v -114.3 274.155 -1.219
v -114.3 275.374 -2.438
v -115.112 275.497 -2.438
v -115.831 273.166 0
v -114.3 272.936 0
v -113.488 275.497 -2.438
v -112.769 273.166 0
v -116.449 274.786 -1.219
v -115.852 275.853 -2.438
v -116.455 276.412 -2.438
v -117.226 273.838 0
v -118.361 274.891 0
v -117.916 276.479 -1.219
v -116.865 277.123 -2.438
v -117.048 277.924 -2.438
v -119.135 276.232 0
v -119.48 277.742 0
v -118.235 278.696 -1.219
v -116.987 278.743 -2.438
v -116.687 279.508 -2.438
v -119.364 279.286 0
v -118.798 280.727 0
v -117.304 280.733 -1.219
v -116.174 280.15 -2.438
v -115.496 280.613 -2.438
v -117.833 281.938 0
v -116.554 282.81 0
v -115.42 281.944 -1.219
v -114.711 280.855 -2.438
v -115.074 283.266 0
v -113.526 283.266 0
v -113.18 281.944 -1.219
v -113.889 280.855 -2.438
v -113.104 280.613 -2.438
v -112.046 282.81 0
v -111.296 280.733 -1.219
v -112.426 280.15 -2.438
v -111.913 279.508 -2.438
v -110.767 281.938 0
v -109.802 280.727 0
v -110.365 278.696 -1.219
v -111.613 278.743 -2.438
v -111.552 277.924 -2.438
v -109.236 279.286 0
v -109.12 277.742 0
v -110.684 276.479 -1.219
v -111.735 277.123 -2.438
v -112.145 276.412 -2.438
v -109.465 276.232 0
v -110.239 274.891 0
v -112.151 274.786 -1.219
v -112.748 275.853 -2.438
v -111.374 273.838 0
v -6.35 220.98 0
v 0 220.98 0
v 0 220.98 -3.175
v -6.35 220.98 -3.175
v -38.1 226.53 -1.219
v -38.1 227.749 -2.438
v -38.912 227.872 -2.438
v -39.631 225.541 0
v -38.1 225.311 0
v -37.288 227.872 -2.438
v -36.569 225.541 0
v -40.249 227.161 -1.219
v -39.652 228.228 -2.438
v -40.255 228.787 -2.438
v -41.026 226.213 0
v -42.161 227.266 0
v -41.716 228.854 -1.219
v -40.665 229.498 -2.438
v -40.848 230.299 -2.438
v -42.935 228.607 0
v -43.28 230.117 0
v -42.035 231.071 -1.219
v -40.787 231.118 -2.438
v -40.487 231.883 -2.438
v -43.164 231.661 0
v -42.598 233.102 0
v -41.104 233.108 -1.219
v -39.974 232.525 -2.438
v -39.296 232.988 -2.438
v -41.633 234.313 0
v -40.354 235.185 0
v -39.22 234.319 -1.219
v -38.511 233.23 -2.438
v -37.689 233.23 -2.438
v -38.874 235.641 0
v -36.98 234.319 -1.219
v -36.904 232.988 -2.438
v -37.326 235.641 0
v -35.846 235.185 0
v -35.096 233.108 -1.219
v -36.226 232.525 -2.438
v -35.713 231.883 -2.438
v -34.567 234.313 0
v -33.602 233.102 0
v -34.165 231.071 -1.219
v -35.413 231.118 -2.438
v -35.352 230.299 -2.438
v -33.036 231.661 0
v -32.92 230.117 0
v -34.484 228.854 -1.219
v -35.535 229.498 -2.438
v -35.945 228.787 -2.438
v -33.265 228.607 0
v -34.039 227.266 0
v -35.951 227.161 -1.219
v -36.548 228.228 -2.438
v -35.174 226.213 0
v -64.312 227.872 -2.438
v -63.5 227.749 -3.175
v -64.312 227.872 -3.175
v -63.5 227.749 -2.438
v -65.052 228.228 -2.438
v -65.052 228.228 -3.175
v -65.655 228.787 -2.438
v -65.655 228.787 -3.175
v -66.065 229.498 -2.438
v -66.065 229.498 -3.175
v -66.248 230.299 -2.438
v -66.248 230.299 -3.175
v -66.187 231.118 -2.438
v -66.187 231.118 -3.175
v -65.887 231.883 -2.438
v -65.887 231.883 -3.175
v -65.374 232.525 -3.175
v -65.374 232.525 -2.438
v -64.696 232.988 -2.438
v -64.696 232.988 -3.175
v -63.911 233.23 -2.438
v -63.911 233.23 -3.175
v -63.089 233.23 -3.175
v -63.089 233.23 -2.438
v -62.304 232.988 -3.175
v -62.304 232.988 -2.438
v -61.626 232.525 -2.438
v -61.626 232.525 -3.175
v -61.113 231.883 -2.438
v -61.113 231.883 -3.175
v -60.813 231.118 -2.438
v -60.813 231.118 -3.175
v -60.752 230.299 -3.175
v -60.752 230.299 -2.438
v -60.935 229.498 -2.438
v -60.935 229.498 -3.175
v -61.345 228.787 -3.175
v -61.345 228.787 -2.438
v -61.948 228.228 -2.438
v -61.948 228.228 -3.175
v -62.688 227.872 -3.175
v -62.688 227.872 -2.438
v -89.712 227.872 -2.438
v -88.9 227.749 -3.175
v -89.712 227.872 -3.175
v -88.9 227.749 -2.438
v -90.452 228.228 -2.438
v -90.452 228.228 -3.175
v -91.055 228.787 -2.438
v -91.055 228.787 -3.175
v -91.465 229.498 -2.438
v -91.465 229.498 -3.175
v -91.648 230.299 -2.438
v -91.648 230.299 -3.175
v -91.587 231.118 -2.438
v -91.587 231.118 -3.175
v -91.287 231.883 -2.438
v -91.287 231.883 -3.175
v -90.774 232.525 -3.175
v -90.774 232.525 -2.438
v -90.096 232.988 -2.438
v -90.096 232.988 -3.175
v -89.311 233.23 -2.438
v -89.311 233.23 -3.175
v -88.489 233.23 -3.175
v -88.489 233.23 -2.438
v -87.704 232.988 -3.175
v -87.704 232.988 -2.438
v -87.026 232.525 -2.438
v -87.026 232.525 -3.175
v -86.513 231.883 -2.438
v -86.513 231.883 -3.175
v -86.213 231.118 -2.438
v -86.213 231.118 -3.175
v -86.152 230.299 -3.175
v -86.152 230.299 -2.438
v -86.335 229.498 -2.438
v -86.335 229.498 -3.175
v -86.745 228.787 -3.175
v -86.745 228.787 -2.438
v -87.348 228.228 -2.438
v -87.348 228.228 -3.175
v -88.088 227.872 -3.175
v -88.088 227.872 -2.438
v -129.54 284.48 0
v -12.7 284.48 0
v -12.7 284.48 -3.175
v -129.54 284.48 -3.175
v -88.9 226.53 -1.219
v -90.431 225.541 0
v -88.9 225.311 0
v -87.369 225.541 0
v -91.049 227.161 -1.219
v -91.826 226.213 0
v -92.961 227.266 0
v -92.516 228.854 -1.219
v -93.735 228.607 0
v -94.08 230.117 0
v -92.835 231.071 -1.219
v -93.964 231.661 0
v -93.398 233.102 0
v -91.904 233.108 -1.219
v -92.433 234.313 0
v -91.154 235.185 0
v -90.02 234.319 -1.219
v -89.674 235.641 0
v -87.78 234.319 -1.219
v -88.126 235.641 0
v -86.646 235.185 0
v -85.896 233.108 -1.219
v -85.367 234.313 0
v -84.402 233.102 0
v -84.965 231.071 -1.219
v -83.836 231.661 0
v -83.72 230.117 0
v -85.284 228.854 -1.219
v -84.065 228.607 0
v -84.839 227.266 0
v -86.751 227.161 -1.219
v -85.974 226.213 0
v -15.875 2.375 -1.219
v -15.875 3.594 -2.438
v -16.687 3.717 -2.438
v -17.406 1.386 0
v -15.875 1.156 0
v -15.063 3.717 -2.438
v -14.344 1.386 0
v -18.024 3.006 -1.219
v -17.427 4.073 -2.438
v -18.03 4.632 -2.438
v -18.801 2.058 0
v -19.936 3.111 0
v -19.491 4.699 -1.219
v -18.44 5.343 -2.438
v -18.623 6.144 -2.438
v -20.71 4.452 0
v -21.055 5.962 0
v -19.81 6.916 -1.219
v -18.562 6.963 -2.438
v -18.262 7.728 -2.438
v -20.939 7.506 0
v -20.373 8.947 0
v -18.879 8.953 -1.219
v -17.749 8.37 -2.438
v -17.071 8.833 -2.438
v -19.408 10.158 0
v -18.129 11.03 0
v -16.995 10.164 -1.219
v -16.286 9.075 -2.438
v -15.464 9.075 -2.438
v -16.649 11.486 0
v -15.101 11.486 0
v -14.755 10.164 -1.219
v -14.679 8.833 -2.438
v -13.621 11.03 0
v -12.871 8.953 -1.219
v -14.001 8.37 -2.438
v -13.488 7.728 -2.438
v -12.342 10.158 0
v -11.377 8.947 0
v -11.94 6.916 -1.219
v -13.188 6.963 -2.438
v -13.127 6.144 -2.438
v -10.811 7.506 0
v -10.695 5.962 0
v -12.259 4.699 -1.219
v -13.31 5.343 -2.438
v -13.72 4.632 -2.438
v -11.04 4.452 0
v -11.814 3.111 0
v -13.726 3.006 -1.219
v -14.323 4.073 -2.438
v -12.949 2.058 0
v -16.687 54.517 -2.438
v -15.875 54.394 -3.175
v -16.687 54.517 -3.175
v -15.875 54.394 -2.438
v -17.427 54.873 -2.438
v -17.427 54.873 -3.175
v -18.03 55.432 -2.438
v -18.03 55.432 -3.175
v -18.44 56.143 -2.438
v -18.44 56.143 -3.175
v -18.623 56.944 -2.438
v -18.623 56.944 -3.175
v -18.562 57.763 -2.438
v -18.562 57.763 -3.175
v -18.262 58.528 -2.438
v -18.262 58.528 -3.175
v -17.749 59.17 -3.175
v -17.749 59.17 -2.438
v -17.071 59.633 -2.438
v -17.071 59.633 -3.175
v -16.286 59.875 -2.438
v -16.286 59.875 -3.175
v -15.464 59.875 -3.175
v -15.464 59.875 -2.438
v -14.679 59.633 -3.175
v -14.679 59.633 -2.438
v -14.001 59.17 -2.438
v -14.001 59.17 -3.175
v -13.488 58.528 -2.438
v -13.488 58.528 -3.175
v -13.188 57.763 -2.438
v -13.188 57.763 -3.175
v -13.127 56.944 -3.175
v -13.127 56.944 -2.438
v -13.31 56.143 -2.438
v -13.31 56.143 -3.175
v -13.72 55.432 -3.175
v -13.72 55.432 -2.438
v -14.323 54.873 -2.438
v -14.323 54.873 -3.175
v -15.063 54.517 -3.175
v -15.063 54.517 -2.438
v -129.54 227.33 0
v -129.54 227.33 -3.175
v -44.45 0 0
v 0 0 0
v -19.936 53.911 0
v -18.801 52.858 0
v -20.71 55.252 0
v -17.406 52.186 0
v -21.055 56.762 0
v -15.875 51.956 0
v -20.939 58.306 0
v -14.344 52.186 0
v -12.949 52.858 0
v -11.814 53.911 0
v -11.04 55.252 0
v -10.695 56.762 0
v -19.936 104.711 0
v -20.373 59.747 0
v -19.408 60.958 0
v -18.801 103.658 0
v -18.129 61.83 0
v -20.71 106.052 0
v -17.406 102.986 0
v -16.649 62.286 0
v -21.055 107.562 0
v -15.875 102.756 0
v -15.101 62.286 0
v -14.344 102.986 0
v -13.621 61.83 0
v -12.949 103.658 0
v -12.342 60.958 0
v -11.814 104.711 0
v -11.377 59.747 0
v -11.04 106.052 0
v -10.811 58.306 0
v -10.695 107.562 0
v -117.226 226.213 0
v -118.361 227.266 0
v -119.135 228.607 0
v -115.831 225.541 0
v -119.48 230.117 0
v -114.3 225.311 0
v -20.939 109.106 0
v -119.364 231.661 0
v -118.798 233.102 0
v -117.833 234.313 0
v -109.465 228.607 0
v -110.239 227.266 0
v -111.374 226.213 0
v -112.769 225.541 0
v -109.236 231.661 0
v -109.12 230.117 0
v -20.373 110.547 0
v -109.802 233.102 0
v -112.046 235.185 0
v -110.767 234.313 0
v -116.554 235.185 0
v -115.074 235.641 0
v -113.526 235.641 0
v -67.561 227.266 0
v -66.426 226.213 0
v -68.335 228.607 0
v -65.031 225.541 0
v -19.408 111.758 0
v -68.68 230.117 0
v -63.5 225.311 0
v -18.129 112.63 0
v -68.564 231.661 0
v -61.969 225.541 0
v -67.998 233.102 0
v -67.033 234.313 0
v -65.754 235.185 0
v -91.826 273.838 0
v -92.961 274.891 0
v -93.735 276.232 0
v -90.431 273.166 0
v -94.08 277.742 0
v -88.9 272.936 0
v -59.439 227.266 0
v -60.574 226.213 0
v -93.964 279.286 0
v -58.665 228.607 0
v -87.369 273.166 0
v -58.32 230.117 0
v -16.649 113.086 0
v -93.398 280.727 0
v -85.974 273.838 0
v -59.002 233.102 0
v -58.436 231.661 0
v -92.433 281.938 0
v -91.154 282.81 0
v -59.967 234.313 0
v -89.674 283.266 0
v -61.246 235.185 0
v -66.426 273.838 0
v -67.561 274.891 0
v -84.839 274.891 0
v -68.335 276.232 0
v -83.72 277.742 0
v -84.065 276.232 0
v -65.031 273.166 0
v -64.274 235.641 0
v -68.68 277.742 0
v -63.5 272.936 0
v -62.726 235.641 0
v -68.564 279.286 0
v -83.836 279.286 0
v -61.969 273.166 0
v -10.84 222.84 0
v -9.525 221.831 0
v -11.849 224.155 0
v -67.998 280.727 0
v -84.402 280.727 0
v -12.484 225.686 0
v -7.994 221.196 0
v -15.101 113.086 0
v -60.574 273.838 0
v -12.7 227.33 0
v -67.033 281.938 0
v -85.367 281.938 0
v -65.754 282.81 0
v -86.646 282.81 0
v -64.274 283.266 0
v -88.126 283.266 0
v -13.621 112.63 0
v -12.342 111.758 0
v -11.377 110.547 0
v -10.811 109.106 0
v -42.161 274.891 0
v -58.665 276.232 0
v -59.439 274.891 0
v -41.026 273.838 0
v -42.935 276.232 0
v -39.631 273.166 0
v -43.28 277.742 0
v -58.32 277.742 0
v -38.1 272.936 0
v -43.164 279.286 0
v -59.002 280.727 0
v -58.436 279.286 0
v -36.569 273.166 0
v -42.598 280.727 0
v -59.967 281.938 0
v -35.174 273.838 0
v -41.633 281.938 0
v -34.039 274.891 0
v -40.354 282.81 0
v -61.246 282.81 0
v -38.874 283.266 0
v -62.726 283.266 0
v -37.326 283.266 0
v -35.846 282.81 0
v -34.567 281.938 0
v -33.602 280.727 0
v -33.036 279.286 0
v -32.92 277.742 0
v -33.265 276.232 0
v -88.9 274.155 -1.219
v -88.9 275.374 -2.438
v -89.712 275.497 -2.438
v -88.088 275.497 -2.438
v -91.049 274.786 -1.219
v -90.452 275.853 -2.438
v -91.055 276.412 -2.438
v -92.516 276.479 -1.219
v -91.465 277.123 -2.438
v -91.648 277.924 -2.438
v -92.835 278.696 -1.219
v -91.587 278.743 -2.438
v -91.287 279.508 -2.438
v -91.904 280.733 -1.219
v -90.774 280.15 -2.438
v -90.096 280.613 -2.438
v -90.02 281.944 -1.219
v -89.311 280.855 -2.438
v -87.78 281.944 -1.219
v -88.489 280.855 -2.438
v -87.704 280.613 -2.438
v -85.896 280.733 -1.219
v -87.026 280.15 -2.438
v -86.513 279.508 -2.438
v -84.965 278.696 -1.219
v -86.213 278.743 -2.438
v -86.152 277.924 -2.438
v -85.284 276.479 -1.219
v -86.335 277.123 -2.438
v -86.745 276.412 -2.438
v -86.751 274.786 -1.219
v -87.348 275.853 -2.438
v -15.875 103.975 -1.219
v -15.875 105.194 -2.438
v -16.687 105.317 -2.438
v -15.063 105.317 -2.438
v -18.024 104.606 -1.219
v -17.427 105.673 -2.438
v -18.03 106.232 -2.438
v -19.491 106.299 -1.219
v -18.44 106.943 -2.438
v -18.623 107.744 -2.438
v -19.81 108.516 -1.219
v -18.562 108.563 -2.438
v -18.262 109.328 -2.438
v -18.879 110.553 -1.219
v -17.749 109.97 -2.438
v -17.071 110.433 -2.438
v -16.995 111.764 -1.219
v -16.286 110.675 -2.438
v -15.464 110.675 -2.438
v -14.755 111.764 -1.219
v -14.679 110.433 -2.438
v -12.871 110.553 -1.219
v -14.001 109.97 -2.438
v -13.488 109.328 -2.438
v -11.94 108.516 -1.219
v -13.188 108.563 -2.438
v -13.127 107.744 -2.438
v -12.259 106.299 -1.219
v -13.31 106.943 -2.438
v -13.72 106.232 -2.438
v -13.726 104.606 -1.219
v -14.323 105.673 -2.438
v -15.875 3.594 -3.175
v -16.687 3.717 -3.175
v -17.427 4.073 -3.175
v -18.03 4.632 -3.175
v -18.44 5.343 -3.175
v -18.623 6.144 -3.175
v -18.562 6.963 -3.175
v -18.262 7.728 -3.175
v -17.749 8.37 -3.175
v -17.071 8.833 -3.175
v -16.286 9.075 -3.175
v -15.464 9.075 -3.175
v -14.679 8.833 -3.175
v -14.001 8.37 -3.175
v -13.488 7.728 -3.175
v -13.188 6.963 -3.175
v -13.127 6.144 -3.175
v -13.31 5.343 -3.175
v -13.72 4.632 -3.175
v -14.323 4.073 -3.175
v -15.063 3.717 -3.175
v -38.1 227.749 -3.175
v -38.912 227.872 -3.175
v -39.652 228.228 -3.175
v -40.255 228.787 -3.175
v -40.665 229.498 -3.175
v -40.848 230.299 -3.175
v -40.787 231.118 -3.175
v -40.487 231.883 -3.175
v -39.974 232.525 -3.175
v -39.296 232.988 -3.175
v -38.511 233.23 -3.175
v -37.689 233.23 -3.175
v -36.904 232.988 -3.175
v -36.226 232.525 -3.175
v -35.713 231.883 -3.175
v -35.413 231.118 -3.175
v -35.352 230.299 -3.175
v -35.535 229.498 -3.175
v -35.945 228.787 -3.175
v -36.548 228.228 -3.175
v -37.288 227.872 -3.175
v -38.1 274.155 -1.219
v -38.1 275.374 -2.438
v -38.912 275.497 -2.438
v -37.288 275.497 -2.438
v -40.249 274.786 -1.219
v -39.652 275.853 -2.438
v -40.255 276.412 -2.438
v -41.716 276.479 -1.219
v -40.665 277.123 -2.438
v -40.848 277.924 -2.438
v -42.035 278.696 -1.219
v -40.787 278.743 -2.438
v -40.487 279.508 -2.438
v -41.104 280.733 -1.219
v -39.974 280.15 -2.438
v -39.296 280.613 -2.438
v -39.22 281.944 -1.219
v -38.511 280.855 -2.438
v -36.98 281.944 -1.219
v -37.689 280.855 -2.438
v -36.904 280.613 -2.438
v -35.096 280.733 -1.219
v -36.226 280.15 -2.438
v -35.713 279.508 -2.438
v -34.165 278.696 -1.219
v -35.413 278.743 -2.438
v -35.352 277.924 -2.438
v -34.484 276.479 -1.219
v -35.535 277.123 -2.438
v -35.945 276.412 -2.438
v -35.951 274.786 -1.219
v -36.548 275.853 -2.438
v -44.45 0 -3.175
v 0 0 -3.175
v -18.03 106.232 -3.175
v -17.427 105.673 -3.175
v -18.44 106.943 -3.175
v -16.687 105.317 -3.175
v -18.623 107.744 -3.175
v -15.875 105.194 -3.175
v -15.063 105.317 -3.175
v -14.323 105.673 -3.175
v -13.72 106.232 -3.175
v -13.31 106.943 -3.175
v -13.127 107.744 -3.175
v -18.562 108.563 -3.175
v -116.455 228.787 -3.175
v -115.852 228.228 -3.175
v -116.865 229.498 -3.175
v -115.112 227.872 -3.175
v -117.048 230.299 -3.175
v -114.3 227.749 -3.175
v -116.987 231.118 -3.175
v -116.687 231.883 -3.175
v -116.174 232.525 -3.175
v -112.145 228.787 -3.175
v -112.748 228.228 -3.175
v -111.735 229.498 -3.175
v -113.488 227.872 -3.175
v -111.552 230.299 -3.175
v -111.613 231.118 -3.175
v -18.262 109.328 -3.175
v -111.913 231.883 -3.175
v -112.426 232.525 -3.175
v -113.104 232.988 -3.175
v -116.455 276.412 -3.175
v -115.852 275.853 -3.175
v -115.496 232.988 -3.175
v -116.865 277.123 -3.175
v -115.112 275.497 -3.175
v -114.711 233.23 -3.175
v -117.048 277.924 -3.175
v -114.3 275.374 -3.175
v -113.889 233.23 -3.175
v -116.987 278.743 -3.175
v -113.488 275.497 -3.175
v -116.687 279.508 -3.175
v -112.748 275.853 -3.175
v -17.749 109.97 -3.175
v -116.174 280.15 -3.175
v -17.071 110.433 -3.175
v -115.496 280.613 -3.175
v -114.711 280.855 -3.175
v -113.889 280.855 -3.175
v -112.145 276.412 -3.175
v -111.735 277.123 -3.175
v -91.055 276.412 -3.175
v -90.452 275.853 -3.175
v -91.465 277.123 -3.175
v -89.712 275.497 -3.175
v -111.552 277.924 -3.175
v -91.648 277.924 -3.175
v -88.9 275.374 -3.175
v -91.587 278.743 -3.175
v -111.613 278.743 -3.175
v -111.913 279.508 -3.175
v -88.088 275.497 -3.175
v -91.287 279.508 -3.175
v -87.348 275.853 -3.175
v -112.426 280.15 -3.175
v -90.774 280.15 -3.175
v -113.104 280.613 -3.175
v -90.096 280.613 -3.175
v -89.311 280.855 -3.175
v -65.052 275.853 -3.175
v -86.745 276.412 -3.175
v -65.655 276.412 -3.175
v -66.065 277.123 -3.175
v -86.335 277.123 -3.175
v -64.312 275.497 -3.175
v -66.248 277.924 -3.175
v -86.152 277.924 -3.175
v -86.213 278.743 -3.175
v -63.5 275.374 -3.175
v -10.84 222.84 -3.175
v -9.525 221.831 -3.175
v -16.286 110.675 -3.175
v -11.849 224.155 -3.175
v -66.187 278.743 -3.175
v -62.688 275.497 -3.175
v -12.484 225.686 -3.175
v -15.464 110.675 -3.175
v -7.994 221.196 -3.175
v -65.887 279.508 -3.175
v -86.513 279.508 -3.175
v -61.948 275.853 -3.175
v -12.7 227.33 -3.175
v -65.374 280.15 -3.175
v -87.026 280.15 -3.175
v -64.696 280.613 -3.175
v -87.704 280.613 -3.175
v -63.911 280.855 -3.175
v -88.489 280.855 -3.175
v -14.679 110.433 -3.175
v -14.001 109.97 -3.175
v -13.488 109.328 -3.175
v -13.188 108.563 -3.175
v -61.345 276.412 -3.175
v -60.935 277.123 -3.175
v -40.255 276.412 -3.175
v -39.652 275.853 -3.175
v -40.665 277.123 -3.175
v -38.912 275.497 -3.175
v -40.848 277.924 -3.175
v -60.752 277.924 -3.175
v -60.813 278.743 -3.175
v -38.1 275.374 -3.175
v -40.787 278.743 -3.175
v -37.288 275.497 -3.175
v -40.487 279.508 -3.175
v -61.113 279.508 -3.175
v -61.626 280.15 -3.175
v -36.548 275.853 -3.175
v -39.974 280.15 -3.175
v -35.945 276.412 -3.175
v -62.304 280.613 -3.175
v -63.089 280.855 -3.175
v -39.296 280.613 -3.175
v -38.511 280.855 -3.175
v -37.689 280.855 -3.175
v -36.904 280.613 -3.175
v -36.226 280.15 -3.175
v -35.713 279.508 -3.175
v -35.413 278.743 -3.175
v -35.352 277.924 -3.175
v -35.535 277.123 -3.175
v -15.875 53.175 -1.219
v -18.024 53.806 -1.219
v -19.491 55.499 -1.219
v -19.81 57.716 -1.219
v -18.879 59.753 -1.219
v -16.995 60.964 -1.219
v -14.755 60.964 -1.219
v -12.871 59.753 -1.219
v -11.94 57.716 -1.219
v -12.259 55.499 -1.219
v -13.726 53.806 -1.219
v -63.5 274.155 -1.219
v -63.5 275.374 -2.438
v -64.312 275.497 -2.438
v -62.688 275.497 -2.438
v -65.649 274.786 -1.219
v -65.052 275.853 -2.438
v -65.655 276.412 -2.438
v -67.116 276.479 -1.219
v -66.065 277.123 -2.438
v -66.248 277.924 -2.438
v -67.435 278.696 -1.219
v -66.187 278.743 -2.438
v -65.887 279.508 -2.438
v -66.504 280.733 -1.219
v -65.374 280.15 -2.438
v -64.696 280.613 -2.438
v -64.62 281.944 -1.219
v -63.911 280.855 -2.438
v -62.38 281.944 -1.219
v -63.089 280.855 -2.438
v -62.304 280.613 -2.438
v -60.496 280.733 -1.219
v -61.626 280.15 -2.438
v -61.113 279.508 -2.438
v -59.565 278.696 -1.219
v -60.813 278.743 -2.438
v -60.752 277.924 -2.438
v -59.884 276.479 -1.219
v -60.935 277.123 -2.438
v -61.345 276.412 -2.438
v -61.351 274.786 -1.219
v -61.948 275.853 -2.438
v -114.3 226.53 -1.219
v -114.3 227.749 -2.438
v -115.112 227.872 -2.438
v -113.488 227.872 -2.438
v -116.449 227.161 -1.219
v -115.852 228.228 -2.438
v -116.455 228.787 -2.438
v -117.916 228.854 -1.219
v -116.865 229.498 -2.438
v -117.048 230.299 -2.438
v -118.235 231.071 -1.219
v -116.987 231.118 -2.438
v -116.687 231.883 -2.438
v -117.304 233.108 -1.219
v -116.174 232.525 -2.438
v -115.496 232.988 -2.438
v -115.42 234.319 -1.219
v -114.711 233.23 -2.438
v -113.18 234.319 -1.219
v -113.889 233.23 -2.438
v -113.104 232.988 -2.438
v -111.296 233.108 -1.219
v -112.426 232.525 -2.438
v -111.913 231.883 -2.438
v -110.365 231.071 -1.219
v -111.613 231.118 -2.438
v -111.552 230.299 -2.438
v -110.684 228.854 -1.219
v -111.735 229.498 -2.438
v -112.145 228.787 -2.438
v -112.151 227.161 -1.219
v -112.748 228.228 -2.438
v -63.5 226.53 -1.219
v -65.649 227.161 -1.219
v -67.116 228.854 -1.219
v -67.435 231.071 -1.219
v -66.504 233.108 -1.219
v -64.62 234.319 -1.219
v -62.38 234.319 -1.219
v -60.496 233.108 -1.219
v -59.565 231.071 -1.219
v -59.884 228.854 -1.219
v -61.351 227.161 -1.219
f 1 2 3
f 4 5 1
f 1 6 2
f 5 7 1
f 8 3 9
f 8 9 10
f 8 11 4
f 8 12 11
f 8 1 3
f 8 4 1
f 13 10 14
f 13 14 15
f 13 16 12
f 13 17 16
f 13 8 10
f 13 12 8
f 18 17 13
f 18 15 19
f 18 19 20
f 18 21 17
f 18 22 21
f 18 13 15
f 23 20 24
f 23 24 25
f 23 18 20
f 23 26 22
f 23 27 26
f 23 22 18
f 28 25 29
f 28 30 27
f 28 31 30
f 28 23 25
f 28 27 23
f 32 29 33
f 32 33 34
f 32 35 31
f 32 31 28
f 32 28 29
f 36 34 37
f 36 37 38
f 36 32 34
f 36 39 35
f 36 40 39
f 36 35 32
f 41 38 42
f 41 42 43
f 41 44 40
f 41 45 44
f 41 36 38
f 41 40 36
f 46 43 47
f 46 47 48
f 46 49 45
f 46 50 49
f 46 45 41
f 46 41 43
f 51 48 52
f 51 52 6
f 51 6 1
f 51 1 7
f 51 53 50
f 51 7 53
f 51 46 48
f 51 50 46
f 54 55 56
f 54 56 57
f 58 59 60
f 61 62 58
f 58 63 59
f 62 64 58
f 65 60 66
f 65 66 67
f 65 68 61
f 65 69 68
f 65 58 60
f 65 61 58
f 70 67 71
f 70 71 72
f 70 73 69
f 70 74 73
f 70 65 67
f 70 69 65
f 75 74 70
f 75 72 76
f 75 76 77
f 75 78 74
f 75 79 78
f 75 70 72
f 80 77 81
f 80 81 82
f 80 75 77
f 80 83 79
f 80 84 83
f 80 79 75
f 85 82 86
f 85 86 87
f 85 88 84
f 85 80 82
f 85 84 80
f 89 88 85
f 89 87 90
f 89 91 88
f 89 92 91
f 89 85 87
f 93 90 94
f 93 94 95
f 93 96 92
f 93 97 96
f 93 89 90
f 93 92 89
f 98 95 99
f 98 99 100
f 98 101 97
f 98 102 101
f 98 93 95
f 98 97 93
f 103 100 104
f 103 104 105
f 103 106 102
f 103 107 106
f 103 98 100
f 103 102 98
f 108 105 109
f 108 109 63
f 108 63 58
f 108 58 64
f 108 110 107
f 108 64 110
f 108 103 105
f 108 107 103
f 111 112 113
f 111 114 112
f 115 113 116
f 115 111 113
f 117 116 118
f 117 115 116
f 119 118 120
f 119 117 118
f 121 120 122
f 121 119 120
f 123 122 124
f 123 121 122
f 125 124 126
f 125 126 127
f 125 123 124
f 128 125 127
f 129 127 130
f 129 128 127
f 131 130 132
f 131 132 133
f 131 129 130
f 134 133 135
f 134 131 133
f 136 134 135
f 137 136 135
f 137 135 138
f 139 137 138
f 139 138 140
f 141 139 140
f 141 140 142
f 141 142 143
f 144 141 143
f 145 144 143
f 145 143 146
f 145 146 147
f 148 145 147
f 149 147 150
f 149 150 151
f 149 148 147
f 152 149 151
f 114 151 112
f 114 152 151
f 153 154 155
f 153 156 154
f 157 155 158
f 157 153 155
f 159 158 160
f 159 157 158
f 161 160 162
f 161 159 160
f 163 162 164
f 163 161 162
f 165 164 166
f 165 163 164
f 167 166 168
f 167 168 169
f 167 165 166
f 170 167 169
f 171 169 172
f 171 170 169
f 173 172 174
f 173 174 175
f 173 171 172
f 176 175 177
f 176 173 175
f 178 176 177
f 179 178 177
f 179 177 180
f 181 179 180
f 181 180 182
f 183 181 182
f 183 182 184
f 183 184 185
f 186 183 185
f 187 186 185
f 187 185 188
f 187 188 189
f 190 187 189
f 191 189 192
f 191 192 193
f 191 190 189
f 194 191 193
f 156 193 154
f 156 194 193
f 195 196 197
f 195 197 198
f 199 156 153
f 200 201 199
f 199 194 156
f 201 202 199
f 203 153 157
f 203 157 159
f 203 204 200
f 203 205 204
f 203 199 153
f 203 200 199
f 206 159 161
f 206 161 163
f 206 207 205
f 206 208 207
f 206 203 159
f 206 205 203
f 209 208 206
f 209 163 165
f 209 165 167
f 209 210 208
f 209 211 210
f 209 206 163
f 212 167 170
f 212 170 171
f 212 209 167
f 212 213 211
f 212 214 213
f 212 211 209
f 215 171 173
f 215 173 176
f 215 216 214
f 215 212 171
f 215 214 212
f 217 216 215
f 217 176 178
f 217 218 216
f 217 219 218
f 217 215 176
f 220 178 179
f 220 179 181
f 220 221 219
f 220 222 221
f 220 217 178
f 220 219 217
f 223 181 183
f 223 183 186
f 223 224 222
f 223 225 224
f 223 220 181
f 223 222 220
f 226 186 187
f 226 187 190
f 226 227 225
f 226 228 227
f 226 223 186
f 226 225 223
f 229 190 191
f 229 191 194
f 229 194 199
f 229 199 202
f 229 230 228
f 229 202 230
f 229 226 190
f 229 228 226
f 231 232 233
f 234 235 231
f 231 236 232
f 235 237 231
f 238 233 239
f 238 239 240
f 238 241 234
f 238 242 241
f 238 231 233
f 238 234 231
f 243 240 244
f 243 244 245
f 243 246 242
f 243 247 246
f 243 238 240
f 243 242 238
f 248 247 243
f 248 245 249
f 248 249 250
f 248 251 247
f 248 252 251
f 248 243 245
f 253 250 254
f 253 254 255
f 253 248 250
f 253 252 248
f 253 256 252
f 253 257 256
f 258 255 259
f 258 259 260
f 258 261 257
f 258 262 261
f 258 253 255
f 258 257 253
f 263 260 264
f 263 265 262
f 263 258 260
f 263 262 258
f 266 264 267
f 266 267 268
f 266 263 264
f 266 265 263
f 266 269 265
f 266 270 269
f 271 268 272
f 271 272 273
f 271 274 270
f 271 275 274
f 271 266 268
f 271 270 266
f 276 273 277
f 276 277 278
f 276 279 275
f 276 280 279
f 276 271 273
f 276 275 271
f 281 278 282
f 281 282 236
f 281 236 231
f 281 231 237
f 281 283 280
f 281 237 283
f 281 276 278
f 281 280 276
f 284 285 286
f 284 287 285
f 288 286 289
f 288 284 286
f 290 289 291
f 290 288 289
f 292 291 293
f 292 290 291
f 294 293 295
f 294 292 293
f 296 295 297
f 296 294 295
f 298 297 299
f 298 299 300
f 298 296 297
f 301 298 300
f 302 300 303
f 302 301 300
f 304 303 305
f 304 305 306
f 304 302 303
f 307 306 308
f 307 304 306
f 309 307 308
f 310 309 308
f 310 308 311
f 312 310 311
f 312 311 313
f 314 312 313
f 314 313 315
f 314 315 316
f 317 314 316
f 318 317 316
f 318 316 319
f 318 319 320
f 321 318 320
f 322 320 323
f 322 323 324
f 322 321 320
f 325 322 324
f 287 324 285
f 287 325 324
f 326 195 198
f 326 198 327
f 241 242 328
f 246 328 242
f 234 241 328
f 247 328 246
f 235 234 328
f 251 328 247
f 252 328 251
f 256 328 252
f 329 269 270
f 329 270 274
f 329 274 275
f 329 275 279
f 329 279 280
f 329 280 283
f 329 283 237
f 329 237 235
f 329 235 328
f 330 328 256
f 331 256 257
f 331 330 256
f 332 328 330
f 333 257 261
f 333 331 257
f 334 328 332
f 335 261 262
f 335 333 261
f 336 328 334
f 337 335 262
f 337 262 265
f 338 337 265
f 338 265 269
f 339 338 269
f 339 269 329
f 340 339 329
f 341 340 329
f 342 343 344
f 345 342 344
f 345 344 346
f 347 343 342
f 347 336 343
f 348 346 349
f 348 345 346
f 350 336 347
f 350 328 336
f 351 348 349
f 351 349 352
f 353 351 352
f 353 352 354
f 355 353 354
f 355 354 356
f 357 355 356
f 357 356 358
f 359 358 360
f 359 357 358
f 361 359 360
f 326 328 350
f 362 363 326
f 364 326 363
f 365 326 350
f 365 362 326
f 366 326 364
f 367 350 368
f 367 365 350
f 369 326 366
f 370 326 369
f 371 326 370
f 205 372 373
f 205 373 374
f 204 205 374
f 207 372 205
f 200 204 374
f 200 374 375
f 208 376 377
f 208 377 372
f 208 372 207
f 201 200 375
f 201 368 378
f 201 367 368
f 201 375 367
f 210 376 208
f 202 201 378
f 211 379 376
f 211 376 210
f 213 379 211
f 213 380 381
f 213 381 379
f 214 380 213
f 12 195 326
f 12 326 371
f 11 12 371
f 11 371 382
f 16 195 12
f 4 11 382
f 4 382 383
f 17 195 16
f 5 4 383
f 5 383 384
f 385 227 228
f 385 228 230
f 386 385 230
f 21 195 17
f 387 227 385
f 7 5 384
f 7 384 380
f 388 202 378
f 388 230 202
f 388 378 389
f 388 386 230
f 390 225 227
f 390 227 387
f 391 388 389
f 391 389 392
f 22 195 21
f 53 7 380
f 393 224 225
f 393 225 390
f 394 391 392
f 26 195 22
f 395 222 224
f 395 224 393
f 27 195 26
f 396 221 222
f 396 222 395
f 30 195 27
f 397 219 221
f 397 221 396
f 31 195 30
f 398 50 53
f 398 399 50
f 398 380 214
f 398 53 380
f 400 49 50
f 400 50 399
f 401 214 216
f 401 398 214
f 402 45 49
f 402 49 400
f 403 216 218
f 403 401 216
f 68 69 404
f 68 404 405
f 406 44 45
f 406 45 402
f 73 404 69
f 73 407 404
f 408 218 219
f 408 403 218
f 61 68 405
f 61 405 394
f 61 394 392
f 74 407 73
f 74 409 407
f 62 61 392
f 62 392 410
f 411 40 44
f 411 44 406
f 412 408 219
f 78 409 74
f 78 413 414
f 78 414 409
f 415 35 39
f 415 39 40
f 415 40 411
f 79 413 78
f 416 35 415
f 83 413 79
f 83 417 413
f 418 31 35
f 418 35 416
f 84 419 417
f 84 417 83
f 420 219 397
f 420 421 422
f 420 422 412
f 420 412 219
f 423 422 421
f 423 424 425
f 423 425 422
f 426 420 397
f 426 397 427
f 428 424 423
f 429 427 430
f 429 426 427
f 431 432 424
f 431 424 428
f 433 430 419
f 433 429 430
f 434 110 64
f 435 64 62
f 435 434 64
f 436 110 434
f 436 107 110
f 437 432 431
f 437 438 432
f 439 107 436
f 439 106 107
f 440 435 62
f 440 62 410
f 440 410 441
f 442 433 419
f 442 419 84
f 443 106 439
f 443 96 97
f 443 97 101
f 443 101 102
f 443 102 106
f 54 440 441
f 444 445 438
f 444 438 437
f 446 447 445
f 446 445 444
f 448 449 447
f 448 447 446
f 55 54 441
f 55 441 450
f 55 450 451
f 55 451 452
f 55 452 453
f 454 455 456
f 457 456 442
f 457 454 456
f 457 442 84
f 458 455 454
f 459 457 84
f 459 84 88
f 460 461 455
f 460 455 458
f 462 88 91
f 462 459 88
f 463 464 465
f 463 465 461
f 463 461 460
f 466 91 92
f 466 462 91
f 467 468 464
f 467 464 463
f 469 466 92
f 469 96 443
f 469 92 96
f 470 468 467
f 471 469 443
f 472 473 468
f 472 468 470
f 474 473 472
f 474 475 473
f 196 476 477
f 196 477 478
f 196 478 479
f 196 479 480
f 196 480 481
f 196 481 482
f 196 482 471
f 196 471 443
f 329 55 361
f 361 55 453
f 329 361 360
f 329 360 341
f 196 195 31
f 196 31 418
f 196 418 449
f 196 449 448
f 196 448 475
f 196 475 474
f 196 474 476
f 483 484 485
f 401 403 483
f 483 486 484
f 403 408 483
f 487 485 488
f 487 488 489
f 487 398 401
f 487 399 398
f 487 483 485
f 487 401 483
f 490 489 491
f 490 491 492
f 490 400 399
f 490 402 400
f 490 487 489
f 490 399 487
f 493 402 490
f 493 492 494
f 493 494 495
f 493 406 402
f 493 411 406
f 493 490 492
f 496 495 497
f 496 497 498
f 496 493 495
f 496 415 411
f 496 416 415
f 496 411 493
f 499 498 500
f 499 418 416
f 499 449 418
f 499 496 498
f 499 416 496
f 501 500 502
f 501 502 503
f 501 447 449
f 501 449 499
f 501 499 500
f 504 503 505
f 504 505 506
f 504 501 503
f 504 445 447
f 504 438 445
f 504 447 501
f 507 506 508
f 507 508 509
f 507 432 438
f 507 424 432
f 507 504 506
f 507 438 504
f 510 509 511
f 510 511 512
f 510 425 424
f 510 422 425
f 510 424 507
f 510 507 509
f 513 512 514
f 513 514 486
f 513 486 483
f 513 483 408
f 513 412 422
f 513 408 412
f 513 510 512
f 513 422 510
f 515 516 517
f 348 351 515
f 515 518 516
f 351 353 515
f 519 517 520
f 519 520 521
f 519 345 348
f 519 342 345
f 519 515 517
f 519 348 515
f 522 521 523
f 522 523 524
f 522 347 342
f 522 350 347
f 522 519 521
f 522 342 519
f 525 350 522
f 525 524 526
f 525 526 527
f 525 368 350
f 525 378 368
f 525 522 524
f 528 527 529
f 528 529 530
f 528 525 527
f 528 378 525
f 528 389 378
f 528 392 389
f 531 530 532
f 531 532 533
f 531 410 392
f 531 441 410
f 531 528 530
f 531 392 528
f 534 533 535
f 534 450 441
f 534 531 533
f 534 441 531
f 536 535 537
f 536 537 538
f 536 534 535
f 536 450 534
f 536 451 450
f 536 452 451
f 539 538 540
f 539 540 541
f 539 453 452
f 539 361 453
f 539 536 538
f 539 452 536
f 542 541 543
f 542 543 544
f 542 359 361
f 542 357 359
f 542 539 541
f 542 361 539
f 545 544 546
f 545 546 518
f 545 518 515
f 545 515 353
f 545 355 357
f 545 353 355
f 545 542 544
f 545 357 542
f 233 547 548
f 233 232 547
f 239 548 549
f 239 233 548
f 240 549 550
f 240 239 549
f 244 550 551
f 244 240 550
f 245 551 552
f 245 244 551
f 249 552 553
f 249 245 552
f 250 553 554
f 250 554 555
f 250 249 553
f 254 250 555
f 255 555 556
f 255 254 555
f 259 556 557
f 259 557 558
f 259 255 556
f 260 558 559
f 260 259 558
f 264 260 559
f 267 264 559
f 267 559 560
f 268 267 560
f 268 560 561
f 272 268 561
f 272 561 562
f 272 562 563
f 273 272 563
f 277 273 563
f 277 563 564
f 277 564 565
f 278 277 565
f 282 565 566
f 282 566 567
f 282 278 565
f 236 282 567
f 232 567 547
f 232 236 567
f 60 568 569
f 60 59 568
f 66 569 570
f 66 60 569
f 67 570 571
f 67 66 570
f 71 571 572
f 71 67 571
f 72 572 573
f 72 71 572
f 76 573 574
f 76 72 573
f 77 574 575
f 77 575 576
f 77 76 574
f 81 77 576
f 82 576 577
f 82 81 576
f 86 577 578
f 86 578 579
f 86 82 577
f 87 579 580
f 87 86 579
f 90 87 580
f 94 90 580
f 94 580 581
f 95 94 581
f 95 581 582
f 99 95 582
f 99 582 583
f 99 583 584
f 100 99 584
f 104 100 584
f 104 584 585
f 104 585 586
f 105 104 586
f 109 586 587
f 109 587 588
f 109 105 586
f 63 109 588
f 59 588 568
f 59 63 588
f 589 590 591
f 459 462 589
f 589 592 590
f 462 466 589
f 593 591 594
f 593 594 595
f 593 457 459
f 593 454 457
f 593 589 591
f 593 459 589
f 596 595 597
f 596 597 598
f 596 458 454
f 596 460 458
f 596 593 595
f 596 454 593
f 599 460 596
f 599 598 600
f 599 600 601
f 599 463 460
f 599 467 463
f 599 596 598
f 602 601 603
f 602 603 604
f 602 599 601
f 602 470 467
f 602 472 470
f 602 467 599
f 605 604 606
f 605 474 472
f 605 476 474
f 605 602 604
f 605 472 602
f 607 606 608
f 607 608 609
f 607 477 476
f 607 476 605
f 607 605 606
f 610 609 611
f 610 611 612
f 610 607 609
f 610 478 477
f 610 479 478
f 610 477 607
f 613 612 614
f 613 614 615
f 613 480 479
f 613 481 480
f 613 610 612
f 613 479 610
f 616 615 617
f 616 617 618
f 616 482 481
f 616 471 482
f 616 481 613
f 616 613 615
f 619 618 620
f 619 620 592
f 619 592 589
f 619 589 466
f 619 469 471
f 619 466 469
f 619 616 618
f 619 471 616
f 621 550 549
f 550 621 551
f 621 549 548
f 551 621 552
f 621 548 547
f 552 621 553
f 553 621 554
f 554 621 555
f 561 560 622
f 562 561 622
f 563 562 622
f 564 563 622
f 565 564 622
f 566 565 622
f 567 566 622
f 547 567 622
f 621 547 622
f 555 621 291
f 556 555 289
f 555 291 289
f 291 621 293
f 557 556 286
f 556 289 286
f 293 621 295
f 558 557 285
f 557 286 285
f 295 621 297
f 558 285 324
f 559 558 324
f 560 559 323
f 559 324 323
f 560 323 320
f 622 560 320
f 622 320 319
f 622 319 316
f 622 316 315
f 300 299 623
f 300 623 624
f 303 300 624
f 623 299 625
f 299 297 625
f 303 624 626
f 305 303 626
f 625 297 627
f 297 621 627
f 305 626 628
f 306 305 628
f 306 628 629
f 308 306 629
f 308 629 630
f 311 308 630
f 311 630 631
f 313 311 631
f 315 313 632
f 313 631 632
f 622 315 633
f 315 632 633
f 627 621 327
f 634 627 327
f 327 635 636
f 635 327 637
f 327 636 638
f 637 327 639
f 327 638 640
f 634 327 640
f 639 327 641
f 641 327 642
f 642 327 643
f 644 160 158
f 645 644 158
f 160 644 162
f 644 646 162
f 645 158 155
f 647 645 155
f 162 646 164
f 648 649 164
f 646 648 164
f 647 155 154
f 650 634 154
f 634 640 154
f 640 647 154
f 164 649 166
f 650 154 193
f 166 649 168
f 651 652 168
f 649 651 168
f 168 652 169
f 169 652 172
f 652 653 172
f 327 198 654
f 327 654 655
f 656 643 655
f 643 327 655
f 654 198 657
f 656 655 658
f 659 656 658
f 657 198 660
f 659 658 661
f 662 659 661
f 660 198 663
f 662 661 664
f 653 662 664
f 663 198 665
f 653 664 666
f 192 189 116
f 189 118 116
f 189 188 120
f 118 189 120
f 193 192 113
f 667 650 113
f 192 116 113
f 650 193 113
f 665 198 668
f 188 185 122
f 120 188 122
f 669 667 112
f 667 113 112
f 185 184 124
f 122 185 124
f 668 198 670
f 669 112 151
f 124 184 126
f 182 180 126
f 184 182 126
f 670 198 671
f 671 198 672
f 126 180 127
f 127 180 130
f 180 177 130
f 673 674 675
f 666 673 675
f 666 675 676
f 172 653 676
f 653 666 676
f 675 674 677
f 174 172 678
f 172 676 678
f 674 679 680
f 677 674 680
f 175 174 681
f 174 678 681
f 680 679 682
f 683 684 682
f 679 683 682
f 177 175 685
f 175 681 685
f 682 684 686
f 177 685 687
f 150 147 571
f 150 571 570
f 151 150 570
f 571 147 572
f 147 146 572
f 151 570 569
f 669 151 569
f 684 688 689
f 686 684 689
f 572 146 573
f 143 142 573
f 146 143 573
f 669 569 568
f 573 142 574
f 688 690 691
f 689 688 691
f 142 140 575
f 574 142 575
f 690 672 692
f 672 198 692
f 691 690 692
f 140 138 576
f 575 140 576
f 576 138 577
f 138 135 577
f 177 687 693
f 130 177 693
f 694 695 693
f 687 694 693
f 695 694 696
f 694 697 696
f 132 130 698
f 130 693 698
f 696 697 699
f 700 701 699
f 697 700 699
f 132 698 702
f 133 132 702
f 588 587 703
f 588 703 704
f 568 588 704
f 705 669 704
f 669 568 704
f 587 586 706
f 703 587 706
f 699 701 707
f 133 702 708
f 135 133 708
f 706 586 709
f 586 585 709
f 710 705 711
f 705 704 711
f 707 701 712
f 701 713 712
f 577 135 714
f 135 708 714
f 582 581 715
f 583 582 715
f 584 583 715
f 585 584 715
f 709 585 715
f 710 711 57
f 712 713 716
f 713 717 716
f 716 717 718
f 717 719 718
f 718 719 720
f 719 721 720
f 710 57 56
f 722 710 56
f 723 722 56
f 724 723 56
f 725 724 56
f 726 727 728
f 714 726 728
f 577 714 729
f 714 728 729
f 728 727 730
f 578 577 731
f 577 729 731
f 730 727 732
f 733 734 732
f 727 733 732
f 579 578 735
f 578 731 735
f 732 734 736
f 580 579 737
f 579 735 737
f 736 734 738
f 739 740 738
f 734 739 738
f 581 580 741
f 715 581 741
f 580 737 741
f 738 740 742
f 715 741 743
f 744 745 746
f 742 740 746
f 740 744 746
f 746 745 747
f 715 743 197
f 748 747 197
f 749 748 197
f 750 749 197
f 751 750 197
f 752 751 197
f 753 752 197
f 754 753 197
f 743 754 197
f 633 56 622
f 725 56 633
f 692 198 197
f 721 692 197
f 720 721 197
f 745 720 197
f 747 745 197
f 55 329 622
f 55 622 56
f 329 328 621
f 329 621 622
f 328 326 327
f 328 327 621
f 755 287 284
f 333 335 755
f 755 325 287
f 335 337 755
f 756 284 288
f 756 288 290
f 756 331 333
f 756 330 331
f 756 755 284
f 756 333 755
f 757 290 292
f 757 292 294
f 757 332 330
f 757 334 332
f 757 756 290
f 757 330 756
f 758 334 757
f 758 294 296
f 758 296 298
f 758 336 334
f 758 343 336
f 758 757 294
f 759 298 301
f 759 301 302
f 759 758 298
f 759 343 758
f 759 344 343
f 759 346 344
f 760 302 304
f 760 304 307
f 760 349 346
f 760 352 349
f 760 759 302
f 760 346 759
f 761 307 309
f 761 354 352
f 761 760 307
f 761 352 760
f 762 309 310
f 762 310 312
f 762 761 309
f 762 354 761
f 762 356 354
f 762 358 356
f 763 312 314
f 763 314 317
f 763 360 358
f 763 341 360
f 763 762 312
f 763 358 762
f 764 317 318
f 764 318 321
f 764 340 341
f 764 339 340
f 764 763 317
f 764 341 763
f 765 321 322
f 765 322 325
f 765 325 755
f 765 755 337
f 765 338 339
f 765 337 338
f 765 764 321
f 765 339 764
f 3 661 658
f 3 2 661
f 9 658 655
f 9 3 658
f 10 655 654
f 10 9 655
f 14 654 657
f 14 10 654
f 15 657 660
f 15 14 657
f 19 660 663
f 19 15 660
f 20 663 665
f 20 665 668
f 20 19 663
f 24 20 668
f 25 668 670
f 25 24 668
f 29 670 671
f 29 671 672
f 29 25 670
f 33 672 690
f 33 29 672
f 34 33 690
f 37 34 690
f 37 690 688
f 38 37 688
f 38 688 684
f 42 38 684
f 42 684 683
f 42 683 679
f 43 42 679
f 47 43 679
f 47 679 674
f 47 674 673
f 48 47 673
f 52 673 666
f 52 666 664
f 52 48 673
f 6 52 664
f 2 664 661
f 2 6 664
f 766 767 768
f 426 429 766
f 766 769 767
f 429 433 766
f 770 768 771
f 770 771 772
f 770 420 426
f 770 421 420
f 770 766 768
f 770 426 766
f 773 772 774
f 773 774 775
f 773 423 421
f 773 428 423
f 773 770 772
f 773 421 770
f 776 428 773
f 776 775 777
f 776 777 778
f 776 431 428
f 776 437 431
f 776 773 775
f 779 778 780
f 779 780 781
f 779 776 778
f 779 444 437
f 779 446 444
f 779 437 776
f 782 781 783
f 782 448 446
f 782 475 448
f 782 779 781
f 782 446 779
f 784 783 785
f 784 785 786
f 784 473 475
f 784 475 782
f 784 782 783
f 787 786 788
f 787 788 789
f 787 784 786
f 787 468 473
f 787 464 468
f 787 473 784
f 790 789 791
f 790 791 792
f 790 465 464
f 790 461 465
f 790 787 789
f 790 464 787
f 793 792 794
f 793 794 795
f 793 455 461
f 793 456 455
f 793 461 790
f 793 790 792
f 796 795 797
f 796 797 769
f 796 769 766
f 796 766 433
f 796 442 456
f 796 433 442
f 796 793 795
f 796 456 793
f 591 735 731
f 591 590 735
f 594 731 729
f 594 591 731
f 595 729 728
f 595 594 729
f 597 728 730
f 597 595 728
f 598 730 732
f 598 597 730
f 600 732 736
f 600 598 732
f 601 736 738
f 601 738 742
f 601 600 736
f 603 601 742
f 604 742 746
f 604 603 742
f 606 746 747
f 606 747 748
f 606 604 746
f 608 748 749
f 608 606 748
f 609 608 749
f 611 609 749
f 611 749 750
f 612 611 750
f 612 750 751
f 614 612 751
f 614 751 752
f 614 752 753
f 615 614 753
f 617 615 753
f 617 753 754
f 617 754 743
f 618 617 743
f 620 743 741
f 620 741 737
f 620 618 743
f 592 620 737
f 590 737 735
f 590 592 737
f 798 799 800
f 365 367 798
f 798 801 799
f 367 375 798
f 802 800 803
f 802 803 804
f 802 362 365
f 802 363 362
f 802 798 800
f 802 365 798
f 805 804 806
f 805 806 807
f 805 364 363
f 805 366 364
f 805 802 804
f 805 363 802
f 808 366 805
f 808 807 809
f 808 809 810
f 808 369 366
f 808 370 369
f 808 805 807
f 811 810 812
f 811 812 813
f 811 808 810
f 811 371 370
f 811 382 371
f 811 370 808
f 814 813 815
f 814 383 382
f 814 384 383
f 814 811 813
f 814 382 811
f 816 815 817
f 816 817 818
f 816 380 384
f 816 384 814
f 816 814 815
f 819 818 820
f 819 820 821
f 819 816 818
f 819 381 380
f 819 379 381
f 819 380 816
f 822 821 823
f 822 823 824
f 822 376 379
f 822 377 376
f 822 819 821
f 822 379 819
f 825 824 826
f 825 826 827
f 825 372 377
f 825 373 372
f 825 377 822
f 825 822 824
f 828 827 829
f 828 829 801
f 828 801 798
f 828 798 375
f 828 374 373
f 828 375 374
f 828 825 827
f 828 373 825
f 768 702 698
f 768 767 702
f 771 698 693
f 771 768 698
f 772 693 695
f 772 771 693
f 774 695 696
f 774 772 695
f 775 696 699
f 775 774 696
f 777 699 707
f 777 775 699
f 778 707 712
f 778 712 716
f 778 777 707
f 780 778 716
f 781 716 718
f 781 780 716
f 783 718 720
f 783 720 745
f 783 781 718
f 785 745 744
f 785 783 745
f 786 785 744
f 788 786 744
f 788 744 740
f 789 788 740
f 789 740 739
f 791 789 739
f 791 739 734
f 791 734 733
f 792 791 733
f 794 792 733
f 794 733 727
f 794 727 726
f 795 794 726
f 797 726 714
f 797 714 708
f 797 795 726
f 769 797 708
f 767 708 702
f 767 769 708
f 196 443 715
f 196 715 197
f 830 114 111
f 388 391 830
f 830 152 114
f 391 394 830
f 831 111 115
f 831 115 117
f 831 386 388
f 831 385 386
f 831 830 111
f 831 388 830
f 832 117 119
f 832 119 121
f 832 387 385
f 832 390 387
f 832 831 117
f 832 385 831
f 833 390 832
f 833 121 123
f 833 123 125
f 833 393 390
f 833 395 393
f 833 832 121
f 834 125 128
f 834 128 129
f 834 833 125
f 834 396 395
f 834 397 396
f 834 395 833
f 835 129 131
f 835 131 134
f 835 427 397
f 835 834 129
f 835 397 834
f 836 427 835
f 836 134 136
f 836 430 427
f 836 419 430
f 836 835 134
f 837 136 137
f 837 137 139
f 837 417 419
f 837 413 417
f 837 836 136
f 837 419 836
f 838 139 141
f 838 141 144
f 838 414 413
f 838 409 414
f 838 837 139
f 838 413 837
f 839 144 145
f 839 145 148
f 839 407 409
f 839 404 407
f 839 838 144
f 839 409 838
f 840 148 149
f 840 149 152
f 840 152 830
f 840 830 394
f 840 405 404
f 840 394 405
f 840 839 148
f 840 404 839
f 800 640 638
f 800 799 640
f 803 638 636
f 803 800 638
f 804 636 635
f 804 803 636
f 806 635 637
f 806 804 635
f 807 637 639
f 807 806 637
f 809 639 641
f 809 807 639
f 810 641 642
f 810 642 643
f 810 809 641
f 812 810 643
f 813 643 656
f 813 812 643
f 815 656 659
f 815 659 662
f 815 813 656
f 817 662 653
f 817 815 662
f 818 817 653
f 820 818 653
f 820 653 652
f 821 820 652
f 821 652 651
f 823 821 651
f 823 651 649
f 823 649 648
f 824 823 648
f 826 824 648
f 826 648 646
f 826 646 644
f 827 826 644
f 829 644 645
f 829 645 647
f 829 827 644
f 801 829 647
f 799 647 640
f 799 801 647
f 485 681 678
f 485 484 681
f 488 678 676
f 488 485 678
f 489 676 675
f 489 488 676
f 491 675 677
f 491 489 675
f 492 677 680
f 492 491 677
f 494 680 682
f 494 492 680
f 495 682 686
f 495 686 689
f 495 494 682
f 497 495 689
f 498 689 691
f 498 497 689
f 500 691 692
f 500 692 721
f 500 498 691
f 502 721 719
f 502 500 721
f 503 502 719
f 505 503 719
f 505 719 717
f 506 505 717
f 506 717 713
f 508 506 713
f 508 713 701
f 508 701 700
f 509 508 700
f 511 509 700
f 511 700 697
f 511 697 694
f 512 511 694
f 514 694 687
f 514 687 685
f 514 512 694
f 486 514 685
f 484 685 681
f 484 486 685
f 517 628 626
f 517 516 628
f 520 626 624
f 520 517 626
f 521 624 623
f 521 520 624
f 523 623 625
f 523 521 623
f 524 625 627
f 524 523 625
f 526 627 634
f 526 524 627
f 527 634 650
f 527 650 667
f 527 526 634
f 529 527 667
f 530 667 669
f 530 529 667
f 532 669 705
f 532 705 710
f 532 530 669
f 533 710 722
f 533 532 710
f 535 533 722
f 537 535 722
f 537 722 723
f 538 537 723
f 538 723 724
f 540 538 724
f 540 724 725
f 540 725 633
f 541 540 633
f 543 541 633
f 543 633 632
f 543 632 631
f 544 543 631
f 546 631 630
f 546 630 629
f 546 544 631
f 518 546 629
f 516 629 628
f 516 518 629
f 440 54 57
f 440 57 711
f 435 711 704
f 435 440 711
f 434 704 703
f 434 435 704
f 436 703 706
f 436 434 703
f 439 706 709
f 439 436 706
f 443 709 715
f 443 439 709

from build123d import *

# Parameters (mm, degrees)
BOSS_EXTRUDE1_DEPTH                       = 3.175
CSK_FOR_0_FLAT_HEAD_MACHINE_SCREW_2_COUNT = 2
CSK_FOR_0_FLAT_HEAD_MACHINE_SCREW_2_PITCH = 47.625
LPATTERN1_COUNT                           = 4
LPATTERN1_PITCH                           = 25.4
LPATTERN2_COUNT                           = 3
LPATTERN2_PITCH                           = 50.8


with BuildPart() as part:
    # Sketch1 → Boss-Extrude1 (new body)
    with BuildSketch(Plane.XY):
        with BuildLine():
            Line((0, 0), (0, 220.98))
            Line((0, 220.98), (-6.35, 220.98))
            ThreePointArc((-6.35, 220.98), (-10.840128061, 222.839871939), (-12.7, 227.33))
            Line((-12.7, 227.33), (-12.7, 284.48))
            Line((-12.7, 284.48), (-129.54, 284.48))
            Line((-129.54, 284.48), (-129.54, 227.33))
            Line((-129.54, 227.33), (-44.45, 0))
            Line((-44.45, 0), (0, 0))
        make_face()
    extrude(amount=-BOSS_EXTRUDE1_DEPTH)

    # Sketch3 → CSK for _0 Flat Head Machine Screw _100 (revolve, cut)
    with BuildSketch(Plane(origin=(-114.3, 278.13, 0), x_dir=(0, -1, 0), z_dir=(1, 0, 0))):
        Polygon((0, 0), (0, 3.175), (2.7559, 3.175), (2.7559, 2.4384), (5.1943, 0), align=None)
    csk_for_0_flat_head_machine_screw_100 = revolve(axis=Axis((-114.3, 278.13, 6.35), (0, 0, -1)), mode=Mode.SUBTRACT)

    # CSK for _0 Flat Head Machine Screw _ 2: CSK for _0 Flat Head Machine Screw _100 ×2
    with Locations(*[(0, -i * CSK_FOR_0_FLAT_HEAD_MACHINE_SCREW_2_PITCH, 0) for i in range(1, CSK_FOR_0_FLAT_HEAD_MACHINE_SCREW_2_COUNT)]):
        add(csk_for_0_flat_head_machine_screw_100, mode=Mode.SUBTRACT)

    # LPattern1: CSK for _0 Flat Head Machine Screw _100 ×4
    with Locations(*[(i * LPATTERN1_PITCH, 0, 0) for i in range(1, LPATTERN1_COUNT)]):
        add(csk_for_0_flat_head_machine_screw_100, mode=Mode.SUBTRACT)

    # LPattern1 copy 1 sketch → LPattern1 copy 1 (revolve, cut)
    with BuildSketch(Plane(origin=(-88.9, 230.505, 0), x_dir=(0, -1, 0), z_dir=(1, 0, 0))):
        Polygon((0, 0), (0, 3.175), (2.7559, 3.175), (2.7559, 2.4384), (5.1943, 0), align=None)
    revolve(axis=Axis((-88.9, 230.505, 6.35), (0, 0, -1)), mode=Mode.SUBTRACT)

    # LPattern1 copy 2 sketch → LPattern1 copy 2 (revolve, cut)
    with BuildSketch(Plane(origin=(-63.5, 230.505, 0), x_dir=(0, -1, 0), z_dir=(1, 0, 0))):
        Polygon((0, 0), (0, 3.175), (2.7559, 3.175), (2.7559, 2.4384), (5.1943, 0), align=None)
    revolve(axis=Axis((-63.5, 230.505, 6.35), (0, 0, -1)), mode=Mode.SUBTRACT)

    # LPattern1 copy 3 sketch → LPattern1 copy 3 (revolve, cut)
    with BuildSketch(Plane(origin=(-38.1, 230.505, 0), x_dir=(0, -1, 0), z_dir=(1, 0, 0))):
        Polygon((0, 0), (0, 3.175), (2.7559, 3.175), (2.7559, 2.4384), (5.1943, 0), align=None)
    revolve(axis=Axis((-38.1, 230.505, 6.35), (0, 0, -1)), mode=Mode.SUBTRACT)

    # Sketch4 → CSK for _0 Flat Head Machine Screw _ 3 (revolve, cut)
    with BuildSketch(Plane(origin=(-15.875, 107.95, 0), x_dir=(0, -1, 0), z_dir=(1, 0, 0))):
        Polygon((0, 0), (0, 3.175), (2.7559, 3.175), (2.7559, 2.4384), (5.1943, 0), align=None)
    csk_for_0_flat_head_machine_screw_3 = revolve(axis=Axis((-15.875, 107.95, 6.35), (0, 0, -1)), mode=Mode.SUBTRACT)

    # LPattern2: CSK for _0 Flat Head Machine Screw _ 3 ×3
    with Locations(*[(0, -i * LPATTERN2_PITCH, 0) for i in range(1, LPATTERN2_COUNT)]):
        add(csk_for_0_flat_head_machine_screw_3, mode=Mode.SUBTRACT)


solid = part.part
